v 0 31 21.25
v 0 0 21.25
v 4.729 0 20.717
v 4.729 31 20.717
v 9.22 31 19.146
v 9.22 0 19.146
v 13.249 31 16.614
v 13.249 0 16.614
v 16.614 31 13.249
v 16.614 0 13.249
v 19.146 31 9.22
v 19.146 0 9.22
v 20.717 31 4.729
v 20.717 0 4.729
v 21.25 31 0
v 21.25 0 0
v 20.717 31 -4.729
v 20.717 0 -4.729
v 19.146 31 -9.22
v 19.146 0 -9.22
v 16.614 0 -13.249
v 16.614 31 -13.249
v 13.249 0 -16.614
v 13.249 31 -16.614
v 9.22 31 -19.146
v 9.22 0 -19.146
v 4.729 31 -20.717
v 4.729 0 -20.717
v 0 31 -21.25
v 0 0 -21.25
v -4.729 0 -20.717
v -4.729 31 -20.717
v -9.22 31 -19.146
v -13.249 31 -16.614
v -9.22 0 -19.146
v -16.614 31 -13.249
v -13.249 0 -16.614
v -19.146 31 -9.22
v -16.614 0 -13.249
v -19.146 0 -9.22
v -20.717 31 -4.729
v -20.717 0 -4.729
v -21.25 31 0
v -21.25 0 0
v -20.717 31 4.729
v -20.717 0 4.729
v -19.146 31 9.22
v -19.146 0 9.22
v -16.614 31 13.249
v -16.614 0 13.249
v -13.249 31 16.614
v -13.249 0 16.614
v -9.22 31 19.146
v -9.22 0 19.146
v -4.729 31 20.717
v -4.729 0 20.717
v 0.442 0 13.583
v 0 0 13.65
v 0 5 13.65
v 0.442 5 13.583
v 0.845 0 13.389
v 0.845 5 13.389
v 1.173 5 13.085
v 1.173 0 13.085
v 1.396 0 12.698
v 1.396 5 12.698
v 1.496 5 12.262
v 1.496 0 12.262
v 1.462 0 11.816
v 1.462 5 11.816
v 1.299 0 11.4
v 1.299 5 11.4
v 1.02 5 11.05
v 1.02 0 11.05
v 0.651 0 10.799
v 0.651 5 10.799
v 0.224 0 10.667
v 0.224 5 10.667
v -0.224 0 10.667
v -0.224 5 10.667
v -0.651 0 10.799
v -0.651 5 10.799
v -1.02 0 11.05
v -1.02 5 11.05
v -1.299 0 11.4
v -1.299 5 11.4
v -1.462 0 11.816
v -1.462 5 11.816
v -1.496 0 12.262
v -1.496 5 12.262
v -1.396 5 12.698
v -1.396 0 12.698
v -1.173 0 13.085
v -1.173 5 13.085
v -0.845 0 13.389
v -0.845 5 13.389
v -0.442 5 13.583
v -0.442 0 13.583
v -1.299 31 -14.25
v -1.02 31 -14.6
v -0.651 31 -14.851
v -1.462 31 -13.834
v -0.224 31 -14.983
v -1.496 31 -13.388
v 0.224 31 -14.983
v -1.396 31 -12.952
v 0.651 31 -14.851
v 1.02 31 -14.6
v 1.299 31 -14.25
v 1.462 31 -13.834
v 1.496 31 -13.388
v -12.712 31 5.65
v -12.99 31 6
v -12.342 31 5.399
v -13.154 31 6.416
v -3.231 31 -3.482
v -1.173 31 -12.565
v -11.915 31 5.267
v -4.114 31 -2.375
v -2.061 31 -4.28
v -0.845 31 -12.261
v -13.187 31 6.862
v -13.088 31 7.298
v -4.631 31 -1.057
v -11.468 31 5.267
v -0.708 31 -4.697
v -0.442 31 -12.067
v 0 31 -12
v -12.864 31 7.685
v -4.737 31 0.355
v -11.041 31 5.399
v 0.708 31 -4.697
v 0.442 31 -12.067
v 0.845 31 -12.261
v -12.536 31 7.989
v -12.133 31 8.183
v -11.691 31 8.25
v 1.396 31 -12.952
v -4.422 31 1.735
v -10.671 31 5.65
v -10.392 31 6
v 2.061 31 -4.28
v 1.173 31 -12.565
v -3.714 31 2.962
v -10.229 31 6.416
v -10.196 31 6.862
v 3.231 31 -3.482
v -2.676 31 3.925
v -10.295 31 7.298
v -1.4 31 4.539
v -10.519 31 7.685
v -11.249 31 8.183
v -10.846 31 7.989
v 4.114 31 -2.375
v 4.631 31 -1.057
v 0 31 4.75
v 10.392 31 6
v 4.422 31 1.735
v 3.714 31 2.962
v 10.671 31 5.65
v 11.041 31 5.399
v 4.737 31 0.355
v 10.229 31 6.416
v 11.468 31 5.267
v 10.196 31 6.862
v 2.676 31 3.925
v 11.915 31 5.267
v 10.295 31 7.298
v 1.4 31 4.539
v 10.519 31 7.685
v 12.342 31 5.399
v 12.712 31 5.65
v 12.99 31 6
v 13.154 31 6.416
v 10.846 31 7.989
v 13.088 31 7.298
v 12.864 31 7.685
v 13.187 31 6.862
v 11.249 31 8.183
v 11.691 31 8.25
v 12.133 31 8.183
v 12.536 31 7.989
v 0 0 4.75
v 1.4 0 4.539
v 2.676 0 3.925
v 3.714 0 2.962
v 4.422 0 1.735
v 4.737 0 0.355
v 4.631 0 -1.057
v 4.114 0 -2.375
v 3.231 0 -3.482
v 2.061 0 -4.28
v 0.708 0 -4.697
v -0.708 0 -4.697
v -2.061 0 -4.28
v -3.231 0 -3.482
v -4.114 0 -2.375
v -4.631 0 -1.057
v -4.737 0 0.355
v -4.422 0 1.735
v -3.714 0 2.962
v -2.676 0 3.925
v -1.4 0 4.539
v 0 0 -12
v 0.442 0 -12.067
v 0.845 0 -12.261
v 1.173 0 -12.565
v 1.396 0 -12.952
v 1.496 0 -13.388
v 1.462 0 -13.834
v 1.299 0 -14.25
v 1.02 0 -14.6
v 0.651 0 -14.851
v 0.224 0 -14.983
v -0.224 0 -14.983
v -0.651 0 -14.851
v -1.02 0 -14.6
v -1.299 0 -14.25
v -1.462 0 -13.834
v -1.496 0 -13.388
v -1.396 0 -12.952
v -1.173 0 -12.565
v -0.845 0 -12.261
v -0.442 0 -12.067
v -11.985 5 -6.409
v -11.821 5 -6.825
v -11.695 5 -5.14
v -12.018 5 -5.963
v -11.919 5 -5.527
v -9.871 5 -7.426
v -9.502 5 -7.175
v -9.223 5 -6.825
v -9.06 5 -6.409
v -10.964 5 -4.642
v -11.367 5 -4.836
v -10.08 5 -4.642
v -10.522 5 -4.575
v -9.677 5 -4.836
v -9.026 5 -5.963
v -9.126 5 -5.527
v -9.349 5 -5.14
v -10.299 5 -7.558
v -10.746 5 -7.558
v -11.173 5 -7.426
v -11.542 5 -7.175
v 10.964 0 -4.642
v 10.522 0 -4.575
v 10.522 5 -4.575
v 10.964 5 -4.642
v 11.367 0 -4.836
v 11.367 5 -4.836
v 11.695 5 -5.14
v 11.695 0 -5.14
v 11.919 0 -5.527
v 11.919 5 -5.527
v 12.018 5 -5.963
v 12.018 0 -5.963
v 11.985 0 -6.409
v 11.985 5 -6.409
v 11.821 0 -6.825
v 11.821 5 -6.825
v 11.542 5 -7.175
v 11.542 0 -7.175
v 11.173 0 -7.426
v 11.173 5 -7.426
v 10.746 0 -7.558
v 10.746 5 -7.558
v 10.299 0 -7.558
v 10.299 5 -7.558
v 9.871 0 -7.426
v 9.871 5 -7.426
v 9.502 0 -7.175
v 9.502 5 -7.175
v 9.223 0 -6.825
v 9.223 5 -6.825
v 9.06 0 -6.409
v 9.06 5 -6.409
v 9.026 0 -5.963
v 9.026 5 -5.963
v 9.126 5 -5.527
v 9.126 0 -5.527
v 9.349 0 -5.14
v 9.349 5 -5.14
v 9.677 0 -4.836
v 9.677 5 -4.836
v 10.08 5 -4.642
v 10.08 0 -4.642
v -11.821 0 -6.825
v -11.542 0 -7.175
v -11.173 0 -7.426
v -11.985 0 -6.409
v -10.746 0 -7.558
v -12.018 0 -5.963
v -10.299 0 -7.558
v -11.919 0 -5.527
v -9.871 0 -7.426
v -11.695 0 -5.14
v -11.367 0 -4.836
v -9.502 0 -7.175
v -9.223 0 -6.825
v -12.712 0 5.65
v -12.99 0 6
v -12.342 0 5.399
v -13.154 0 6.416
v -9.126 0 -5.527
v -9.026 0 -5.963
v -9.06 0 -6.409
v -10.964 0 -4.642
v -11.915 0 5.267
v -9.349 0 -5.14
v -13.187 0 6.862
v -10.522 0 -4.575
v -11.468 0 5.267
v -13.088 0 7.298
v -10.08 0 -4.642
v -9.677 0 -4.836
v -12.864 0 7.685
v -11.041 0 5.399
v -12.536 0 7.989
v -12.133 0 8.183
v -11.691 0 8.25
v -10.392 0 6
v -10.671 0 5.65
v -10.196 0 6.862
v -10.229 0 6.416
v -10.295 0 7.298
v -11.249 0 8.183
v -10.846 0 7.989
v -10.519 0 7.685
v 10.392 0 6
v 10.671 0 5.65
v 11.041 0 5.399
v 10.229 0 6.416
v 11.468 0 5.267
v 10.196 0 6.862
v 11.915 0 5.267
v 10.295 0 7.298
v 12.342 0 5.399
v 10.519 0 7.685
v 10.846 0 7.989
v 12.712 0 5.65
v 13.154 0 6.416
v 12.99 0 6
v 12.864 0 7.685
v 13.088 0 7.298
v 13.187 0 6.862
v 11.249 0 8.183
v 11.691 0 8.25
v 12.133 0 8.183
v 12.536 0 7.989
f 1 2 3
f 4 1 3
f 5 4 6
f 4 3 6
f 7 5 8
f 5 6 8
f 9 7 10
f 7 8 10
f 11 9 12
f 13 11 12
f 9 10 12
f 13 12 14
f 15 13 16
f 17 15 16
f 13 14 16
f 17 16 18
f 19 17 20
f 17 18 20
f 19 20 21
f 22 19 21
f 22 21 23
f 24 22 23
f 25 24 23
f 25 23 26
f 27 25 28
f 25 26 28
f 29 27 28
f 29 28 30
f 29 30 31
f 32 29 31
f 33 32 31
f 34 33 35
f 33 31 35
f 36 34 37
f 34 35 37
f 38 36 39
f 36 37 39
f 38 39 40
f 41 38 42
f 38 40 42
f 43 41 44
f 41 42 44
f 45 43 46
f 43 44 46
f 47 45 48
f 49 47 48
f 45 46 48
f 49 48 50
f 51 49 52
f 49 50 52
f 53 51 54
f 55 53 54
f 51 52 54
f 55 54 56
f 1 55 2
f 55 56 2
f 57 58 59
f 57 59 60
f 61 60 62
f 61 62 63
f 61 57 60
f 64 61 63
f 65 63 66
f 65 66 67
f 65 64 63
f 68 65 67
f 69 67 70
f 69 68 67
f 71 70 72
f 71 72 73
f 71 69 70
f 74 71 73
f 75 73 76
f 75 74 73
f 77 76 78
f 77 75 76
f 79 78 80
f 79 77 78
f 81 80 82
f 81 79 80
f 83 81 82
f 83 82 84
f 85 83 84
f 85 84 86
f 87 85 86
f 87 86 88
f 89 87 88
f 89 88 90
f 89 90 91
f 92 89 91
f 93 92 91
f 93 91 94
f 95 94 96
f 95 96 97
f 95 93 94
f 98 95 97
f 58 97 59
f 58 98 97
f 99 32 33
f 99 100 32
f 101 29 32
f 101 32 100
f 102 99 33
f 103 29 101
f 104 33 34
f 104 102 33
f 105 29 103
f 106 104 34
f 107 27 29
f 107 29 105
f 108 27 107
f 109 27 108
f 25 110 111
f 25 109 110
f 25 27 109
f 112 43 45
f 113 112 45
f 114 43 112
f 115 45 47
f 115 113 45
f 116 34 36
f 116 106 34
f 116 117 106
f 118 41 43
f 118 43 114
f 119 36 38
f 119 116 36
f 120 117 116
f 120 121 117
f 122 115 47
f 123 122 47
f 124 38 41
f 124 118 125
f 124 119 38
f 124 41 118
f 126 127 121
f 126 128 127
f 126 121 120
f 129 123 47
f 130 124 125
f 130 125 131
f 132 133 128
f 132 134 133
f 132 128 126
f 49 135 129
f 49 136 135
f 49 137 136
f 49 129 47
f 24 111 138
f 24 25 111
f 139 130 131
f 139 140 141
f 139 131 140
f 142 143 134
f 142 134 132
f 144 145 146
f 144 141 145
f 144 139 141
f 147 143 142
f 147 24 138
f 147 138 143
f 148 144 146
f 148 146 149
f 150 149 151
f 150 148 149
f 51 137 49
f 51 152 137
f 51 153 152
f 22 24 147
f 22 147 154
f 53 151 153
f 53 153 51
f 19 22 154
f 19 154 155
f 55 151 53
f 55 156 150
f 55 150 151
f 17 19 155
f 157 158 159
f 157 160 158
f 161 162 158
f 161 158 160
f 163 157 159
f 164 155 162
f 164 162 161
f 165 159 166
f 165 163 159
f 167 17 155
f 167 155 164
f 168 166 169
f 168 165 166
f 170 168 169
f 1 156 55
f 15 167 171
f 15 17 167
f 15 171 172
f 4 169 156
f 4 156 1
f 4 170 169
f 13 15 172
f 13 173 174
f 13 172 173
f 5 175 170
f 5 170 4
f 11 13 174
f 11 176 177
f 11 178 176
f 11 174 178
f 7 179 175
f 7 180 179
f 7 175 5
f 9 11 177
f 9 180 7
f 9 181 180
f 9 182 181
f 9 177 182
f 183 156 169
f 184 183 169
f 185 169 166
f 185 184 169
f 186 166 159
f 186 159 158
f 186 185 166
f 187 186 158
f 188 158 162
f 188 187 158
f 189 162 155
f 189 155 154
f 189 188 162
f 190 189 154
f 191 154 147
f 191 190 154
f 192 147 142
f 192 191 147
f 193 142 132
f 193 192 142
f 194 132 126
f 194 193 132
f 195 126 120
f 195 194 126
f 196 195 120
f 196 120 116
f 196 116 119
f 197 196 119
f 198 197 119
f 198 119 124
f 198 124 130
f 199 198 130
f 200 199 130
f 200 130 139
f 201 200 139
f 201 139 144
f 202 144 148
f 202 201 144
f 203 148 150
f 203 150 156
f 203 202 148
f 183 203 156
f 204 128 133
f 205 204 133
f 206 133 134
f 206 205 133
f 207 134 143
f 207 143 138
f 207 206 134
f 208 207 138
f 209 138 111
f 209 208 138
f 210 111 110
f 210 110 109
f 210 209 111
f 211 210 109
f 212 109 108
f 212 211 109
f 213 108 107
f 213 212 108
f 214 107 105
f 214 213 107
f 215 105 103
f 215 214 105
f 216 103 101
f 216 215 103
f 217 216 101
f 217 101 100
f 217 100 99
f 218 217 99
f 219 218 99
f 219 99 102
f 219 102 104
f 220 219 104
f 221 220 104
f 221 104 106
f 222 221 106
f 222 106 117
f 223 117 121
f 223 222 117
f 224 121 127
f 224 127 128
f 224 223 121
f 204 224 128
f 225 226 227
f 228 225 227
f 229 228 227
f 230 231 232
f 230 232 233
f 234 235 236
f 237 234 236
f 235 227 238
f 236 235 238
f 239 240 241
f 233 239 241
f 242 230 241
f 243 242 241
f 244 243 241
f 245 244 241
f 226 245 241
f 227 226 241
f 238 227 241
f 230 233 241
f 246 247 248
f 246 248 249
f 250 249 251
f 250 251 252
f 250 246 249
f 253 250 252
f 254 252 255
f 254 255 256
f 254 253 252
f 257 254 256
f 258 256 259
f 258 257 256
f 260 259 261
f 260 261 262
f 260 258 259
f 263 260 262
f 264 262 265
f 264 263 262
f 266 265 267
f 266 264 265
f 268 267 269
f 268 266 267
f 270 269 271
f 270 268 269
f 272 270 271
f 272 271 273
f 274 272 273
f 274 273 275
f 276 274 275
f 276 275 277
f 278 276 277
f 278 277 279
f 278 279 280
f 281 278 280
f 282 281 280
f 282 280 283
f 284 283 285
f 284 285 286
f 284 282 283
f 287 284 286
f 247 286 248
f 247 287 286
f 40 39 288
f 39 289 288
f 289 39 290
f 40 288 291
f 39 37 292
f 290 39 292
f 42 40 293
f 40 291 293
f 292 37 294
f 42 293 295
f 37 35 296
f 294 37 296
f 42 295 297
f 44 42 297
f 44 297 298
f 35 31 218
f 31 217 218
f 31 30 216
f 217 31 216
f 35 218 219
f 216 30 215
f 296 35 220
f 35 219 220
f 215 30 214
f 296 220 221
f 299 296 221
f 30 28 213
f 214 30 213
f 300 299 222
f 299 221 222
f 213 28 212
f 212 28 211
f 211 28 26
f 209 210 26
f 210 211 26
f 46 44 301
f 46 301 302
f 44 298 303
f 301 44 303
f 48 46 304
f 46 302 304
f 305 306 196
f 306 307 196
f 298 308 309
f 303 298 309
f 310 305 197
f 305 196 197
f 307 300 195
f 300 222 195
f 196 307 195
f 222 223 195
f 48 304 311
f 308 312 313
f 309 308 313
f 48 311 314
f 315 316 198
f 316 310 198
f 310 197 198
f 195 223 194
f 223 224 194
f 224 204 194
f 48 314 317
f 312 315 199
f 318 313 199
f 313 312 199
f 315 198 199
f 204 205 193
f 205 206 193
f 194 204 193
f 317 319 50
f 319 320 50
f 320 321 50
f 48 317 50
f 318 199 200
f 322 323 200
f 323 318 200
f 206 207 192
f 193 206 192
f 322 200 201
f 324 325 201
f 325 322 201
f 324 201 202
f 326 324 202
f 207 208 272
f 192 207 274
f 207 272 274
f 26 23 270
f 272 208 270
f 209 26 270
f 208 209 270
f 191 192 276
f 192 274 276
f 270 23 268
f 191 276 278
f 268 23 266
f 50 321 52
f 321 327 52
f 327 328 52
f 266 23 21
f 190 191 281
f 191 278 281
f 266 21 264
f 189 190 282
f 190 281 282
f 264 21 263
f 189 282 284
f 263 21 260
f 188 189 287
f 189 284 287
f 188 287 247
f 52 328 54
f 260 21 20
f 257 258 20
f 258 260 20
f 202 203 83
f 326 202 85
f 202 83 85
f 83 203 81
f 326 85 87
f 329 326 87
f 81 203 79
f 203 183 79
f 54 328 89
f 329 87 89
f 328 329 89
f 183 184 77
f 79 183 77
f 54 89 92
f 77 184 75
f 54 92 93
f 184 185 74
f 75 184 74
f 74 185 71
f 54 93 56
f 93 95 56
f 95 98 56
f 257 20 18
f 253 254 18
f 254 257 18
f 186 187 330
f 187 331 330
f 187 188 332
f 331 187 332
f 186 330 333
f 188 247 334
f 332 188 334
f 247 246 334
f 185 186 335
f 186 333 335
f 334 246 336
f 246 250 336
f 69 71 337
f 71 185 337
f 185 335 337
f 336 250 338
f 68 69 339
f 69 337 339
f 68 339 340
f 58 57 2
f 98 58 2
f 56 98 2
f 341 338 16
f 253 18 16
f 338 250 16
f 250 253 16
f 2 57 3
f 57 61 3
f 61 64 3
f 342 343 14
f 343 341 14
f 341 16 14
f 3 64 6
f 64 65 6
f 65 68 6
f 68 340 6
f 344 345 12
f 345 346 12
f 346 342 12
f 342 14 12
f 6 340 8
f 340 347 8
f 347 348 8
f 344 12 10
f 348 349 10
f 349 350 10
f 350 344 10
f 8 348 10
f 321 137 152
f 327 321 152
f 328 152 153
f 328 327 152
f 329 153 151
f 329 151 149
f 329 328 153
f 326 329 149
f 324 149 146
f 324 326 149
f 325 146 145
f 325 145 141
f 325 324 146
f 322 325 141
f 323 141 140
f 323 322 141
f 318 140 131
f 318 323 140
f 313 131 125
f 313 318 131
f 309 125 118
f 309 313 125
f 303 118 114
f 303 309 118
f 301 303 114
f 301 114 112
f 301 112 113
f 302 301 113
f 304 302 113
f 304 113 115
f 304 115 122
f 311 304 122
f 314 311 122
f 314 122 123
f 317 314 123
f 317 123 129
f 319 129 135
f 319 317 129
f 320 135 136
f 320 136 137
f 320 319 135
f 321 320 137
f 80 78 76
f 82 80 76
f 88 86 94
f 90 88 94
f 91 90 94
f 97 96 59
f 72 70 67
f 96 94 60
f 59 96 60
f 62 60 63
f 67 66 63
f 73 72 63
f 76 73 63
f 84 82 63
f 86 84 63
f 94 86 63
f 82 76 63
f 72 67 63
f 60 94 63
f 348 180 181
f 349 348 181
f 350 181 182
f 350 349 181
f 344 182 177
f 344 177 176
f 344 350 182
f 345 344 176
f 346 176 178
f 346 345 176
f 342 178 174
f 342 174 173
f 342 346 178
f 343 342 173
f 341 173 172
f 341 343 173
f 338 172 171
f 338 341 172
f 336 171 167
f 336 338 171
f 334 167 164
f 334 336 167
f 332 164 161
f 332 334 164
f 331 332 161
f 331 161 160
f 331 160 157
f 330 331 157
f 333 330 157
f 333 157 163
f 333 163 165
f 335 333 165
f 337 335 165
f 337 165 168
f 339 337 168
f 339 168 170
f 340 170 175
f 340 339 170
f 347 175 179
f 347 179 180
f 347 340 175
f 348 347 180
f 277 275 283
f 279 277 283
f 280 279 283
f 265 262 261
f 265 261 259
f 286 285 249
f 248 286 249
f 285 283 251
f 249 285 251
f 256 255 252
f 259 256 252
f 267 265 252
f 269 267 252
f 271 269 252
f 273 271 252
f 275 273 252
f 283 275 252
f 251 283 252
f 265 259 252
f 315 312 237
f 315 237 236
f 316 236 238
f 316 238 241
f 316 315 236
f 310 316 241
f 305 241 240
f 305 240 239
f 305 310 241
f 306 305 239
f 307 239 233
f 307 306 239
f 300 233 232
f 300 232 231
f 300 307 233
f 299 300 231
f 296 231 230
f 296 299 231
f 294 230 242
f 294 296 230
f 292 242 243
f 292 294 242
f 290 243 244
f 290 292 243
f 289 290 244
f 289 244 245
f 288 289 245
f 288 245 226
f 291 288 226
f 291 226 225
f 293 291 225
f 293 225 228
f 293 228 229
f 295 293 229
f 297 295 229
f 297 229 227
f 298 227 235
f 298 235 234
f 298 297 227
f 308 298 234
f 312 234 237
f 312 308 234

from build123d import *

# Parameters (mm, degrees)
SKETCH_1_R          = 21.25
SKETCH_1_R_2        = 1.5
SKETCH_1_R_3        = 4.75
EXTRUDE_1_DEPTH     = 31
SKETCH_1_3_R        = 1.5
CUT_EXTRUDE_1_DEPTH = 5


with BuildPart() as part:
    # 草图1 → 凸台-拉伸1 (new body)
    with BuildSketch(Plane(origin=(0, 0, 0), x_dir=(1, 0, 0), z_dir=(0, 1, 0))):
        Circle(SKETCH_1_R)
        with Locations((-11.691342951, -6.75)):
            Circle(SKETCH_1_R_2, mode=Mode.SUBTRACT)
        with Locations((11.691342951, -6.75)):
            Circle(SKETCH_1_R_2, mode=Mode.SUBTRACT)
        Circle(SKETCH_1_R_3, mode=Mode.SUBTRACT)
        with Locations((0, 13.5)):
            Circle(SKETCH_1_R_2, mode=Mode.SUBTRACT)
    extrude(amount=EXTRUDE_1_DEPTH)

    # 草图1<3> → 切除-拉伸1 (cut)
    with BuildSketch(Plane(origin=(0, 0, 0), x_dir=(1, 0, 0), z_dir=(0, 1, 0))):
        with Locations((10.522208656, 6.075)):
            Circle(SKETCH_1_3_R)
        with Locations((0, -12.15)):
            Circle(SKETCH_1_3_R)
        with Locations((-10.522208656, 6.075)):
            Circle(SKETCH_1_3_R)
    extrude(amount=CUT_EXTRUDE_1_DEPTH, mode=Mode.SUBTRACT)


solid = part.part
